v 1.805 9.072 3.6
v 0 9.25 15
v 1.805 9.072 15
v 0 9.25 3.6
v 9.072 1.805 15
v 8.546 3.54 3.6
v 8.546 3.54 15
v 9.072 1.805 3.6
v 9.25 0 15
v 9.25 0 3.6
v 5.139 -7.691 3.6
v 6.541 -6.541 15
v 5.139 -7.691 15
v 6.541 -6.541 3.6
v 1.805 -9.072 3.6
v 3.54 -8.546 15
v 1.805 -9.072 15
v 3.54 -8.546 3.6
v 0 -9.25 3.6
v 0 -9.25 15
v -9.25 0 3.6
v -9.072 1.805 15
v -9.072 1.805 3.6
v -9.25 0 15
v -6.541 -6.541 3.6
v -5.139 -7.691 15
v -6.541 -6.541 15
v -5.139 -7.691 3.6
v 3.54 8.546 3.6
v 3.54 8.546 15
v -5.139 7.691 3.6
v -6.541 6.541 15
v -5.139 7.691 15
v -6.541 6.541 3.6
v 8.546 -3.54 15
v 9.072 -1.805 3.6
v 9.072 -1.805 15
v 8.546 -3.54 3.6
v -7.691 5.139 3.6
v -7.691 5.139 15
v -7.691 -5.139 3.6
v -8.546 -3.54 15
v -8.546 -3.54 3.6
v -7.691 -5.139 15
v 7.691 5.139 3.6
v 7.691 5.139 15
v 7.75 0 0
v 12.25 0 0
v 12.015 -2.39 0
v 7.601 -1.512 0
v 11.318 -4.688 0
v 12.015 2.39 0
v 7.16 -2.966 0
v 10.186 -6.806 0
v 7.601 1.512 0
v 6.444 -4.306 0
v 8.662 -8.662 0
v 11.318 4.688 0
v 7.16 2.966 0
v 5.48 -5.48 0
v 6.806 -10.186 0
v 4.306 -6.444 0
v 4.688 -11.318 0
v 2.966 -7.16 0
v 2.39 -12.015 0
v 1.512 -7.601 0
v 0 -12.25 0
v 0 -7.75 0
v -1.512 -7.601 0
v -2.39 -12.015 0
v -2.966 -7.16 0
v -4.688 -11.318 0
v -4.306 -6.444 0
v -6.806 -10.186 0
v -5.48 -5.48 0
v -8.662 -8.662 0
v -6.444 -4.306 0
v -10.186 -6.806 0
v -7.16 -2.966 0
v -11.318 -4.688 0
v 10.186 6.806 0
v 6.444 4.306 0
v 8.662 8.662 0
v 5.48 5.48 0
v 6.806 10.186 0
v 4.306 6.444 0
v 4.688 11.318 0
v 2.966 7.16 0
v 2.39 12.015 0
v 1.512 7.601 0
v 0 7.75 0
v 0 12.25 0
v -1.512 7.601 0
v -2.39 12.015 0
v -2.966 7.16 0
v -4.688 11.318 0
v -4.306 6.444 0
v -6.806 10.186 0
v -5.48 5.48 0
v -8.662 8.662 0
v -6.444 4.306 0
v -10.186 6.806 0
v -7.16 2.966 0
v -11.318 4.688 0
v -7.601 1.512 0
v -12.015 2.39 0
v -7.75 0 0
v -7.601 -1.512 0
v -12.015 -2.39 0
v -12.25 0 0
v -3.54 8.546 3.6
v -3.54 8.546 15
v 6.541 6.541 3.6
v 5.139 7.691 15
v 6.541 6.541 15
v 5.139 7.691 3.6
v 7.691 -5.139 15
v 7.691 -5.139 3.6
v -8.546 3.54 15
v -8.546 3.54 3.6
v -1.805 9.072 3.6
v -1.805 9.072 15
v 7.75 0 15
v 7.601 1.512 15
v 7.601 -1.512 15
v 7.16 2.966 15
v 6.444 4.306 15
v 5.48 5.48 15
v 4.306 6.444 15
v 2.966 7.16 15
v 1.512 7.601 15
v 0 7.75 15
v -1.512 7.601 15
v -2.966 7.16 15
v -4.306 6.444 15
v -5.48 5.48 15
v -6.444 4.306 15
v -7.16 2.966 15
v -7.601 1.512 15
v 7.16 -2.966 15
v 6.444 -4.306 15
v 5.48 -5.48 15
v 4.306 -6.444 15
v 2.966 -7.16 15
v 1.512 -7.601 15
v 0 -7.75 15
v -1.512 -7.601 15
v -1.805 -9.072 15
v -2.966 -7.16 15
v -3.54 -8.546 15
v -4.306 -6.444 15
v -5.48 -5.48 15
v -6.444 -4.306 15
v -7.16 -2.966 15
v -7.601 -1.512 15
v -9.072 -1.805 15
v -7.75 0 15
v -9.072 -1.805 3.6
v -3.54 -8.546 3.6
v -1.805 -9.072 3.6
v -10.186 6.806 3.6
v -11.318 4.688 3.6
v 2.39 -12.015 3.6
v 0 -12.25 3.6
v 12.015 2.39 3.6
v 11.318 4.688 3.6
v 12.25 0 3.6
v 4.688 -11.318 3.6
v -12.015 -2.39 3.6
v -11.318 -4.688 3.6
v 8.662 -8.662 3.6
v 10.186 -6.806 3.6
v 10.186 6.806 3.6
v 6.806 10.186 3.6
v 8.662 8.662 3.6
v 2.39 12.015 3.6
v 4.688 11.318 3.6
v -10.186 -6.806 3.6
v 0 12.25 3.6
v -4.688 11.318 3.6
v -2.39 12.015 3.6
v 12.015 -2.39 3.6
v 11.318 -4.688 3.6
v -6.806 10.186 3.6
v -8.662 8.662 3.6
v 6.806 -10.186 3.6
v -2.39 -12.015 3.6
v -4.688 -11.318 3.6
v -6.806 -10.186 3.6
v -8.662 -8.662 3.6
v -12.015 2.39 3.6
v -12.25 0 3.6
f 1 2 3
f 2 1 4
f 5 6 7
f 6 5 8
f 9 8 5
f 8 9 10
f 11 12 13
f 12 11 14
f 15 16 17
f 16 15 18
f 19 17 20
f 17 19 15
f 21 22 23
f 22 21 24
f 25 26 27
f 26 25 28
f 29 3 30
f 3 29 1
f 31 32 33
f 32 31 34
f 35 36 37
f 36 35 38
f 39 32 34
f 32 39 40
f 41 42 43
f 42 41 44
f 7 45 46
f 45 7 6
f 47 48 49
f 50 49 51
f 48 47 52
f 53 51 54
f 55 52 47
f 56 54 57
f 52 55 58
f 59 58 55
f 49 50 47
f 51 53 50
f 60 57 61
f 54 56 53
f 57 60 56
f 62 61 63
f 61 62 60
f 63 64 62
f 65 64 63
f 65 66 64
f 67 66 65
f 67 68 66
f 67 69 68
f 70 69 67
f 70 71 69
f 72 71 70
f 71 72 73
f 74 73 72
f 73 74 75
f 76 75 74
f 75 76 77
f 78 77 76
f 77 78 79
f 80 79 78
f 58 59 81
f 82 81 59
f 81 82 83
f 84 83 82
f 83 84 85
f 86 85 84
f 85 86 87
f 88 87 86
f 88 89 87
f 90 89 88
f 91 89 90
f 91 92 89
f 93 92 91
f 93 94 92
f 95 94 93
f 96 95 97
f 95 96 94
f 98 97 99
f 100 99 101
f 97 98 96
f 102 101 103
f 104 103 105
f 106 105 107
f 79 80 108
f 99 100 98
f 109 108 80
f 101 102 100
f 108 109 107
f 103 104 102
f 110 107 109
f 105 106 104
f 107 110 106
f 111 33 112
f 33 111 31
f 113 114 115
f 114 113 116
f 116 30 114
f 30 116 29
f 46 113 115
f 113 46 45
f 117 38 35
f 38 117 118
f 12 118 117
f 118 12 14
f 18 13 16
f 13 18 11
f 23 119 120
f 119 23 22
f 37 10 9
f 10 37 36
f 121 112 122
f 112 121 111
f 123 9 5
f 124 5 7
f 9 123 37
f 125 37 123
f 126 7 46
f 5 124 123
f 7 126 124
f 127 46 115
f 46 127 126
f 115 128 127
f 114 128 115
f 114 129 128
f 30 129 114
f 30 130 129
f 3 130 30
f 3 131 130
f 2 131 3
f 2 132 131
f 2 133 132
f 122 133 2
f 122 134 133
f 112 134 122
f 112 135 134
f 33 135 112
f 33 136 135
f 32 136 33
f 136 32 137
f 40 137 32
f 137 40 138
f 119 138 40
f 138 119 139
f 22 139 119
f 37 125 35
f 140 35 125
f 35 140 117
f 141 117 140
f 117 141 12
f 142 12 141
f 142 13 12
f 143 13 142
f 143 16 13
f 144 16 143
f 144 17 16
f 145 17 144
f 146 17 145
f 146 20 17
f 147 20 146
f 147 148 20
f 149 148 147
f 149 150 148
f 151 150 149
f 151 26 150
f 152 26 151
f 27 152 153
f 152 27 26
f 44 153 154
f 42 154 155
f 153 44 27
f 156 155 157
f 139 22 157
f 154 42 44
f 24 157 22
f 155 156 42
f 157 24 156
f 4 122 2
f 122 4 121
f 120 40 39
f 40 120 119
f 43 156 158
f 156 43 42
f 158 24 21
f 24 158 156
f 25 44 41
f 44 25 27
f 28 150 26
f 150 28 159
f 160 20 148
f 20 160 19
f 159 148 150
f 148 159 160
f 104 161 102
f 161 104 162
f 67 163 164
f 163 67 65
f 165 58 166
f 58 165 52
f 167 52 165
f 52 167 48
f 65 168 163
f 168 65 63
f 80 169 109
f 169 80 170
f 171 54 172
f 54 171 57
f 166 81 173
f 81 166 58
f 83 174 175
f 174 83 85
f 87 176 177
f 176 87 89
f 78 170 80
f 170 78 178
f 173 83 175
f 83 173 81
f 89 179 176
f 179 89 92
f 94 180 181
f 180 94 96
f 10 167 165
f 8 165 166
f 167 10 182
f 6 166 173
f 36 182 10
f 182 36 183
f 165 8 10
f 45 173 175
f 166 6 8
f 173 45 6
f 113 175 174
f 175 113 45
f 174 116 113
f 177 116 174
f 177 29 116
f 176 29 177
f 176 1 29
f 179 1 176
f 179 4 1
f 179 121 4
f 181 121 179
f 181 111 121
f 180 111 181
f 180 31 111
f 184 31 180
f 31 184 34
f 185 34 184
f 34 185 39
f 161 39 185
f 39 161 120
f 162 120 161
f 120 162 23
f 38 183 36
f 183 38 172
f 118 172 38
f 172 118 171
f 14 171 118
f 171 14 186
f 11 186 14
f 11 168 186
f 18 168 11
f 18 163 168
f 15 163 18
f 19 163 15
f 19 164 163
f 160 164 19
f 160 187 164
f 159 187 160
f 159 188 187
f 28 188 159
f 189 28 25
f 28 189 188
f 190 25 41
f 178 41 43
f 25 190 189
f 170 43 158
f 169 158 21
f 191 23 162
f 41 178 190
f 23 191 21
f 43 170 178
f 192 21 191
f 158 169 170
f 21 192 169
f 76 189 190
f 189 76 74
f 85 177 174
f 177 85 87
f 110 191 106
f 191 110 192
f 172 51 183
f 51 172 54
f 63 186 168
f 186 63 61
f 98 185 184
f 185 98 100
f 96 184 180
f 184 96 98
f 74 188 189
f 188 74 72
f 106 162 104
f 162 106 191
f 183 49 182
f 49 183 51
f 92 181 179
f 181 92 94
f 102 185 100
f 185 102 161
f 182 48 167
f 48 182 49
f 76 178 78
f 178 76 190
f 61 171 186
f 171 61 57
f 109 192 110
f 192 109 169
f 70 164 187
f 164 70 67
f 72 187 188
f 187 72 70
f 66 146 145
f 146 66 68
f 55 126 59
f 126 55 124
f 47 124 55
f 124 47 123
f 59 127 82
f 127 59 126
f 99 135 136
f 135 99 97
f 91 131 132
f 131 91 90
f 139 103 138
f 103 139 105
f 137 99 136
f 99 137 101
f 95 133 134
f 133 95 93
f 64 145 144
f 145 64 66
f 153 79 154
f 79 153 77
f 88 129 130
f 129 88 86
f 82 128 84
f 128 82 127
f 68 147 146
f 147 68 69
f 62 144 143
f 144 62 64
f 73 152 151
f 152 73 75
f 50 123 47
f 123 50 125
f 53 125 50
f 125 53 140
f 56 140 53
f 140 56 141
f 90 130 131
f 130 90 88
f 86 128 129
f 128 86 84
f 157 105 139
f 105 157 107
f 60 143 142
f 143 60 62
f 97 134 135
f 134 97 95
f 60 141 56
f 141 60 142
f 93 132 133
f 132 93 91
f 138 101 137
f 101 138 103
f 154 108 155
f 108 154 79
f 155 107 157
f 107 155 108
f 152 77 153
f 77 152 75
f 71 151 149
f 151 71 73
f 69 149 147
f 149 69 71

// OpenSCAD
$fn = 32;

// ----------------------------------------------------------------------
// Spacer sleeve: 18.5 / 15.5 x 15 mm
// ----------------------------------------------------------------------

// --- parameters (mm) ---
outer_d = 18.5;           // outside diameter
inner_d = 15.5;           // shaft bore
length = 15;              // sleeve length
flange_d = 24.5;          // collar diameter
flange_t = 3;             // collar thickness

module sleeve() {
  cylinder(h = length, d = outer_d);
  cylinder(h = flange_t + 0.6, d = flange_d);
}

difference() {
  sleeve();
  translate([0, 0, -1]) cylinder(h = length + 2, d = inner_d);
}
